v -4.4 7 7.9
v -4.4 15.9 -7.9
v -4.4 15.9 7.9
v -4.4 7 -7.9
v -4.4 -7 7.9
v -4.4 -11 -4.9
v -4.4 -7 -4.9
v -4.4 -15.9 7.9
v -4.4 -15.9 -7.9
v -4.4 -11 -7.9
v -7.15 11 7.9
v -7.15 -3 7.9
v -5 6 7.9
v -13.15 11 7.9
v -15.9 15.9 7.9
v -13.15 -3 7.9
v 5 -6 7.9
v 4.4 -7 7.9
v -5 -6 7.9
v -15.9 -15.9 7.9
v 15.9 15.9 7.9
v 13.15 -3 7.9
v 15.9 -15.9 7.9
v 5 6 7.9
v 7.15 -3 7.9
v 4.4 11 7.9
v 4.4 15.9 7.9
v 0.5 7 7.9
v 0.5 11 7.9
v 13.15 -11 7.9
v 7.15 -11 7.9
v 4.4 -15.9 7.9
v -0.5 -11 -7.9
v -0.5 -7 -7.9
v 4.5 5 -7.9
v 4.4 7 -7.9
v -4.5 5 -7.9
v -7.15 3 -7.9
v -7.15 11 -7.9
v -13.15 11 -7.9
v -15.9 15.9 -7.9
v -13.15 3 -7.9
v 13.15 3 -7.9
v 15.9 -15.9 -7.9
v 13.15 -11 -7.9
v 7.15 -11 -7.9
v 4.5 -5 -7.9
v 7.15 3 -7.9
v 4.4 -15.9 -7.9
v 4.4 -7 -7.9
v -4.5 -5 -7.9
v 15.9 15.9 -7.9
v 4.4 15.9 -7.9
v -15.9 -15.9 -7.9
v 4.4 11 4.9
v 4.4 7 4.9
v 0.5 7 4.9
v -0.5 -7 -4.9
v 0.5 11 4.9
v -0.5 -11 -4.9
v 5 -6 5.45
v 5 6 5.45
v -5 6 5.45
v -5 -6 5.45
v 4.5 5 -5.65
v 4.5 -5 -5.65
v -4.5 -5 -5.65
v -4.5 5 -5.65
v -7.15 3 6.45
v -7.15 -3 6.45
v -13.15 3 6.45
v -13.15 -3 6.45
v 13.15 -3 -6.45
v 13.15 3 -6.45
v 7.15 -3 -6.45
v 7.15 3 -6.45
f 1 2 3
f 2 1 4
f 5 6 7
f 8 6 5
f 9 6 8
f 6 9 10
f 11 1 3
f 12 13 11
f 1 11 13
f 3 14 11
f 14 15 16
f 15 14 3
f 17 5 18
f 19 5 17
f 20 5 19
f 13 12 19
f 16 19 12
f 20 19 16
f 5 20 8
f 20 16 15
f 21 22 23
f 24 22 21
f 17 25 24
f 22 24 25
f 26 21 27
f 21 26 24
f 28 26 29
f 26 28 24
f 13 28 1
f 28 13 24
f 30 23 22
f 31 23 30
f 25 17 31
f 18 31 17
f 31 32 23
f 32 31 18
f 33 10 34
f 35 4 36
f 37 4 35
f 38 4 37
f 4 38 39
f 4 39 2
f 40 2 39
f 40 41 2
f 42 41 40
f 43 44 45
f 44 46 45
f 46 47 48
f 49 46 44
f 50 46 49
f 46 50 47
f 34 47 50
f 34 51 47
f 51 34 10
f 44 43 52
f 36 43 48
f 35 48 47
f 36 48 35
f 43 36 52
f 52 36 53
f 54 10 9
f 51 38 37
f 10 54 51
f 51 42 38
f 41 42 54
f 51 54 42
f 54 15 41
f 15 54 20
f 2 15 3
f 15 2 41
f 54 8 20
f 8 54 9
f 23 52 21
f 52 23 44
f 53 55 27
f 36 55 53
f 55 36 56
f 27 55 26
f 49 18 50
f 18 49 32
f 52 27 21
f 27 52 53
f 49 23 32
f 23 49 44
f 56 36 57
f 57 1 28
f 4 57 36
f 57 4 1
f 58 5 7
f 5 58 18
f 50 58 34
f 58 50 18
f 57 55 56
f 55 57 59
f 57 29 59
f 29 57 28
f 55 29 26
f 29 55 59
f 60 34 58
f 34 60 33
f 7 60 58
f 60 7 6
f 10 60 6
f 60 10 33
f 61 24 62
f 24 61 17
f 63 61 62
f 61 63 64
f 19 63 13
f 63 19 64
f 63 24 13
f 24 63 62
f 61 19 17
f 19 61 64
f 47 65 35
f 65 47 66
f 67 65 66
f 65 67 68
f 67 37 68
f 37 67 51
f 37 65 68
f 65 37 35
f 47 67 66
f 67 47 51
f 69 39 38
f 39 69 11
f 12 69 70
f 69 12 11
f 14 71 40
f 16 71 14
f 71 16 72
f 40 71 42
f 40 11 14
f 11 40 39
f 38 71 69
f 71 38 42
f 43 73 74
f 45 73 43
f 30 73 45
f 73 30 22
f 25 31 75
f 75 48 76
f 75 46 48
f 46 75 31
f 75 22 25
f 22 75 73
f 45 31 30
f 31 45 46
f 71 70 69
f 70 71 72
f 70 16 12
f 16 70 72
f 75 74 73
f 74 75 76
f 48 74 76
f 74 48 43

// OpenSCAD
// Stepped H-like bracket/block (prismatic, sharp edges)
// Target bounding box: 31.8 x 31.8 x 15.8 mm

$fn = 48;

// -------------------- Parameters --------------------
bbox_x = 31.8;
bbox_y = 31.8;
bbox_z = 15.8;

// End blocks (left/right)
end_w = 11.5;          // X width of each end block
end_d = bbox_y;        // Y depth
end_h = bbox_z;        // Z height

// Central bridge (connects end blocks)
bridge_d = 14;         // Y depth of bridge (narrower than end blocks)

// Asymmetric pads (additive, create asymmetric top/bottom silhouette)
pad_w = 7;             // X
pad_d = 10;            // Y
pad_h = 3;             // Z
pad_offset_x = 4;      // X offset from center
pad_offset_y = 6;      // Y offset from center

// Shoulder steps/rebates (subtractive)
top_rebate_depth = 2.2;
top_rebate_w = 10;
top_rebate_d = 12;

bottom_rebate_depth = 2.0;
bottom_rebate_w = 9;
bottom_rebate_d = 10;

// Internal relief cutouts (subtractive, through Z)
relief_w = 6;
relief_d = 8;
relief_offset_y = 7;

// Small additional rebates (subtractive)
small_rebate_w = 6;
small_rebate_d = 6;
small_rebate_depth = 1.2;

// Robustness
overlap = 0.6;           // small overlap to guarantee connectivity
cut_clear = 0.25;        // extra depth for clean subtraction

// -------------------- Helpers --------------------
function clamp(v, lo, hi) = v < lo ? lo : (v > hi ? hi : v);

// Derived: ensure exact bbox in X by solving bridge width from bbox_x and end_w
// Total X = end_w + bridge_w + end_w
bridge_w = clamp(bbox_x - 2*end_w, 0.1, bbox_x);

// -------------------- Base solids --------------------
module end_block(sign=1) { // sign = -1 left, +1 right
    translate([sign*(bbox_x/2 - end_w/2), 0, 0])
        cube([end_w, end_d, end_h], center=true);
}

module central_bridge() {
    // Bridge spans exactly between end blocks; add tiny overlap in X for guaranteed union
    cube([bridge_w + 2*overlap, bridge_d, bbox_z], center=true);
}

module offset_pad_top() {
    // Additive pad on top face, offset in +X,+Y
    translate([ pad_offset_x,  pad_offset_y,  bbox_z/2 - pad_h/2])
        cube([pad_w, clamp(pad_d, 0.1, bbox_y), pad_h], center=true);
}

module offset_pad_bottom() {
    // Additive pad on bottom face, offset in -X,-Y (asymmetric overall)
    translate([-pad_offset_x, -pad_offset_y, -bbox_z/2 + pad_h/2])
        cube([pad_w, clamp(pad_d, 0.1, bbox_y), pad_h], center=true);
}

// -------------------- Subtractive features --------------------
module top_rebate() {
    translate([0, 0, bbox_z/2 - (top_rebate_depth + cut_clear)/2])
        cube([top_rebate_w, clamp(top_rebate_d, 0.1, bbox_y), top_rebate_depth + cut_clear], center=true);
}

module bottom_rebate() {
    translate([0, 0, -bbox_z/2 + (bottom_rebate_depth + cut_clear)/2])
        cube([bottom_rebate_w, clamp(bottom_rebate_d, 0.1, bbox_y), bottom_rebate_depth + cut_clear], center=true);
}

module internal_relief(sign=1) {
    // Through-cut relief near each end block, offset in Y opposite on each side
    translate([sign*(bbox_x/2 - end_w/2), -sign*relief_offset_y, 0])
        cube([relief_w, relief_d, bbox_z + 2*cut_clear], center=true);
}

module small_rebate_left_top() {
    translate([-(bbox_x/2 - end_w/2), 0, bbox_z/2 - (small_rebate_depth + cut_clear)/2])
        cube([small_rebate_w, small_rebate_d, small_rebate_depth + cut_clear], center=true);
}

module small_rebate_right_bottom() {
    translate([(bbox_x/2 - end_w/2), 0, -bbox_z/2 + (small_rebate_depth + cut_clear)/2])
        cube([small_rebate_w, small_rebate_d, small_rebate_depth + cut_clear], center=true);
}

// -------------------- Main body (ONE connected solid) --------------------
module main_body() {
    union() {
        end_block(-1);
        end_block( 1);
        central_bridge();
        offset_pad_top();
        offset_pad_bottom();
    }
}

// -------------------- Final model --------------------
difference() {
    main_body();

    // Shoulder steps
    top_rebate();
    bottom_rebate();

    // Internal reliefs (asymmetric pair)
    internal_relief(-1);
    internal_relief( 1);

    // Extra small rebates (diagonal/asymmetric)
    small_rebate_left_top();
    small_rebate_right_bottom();
}
